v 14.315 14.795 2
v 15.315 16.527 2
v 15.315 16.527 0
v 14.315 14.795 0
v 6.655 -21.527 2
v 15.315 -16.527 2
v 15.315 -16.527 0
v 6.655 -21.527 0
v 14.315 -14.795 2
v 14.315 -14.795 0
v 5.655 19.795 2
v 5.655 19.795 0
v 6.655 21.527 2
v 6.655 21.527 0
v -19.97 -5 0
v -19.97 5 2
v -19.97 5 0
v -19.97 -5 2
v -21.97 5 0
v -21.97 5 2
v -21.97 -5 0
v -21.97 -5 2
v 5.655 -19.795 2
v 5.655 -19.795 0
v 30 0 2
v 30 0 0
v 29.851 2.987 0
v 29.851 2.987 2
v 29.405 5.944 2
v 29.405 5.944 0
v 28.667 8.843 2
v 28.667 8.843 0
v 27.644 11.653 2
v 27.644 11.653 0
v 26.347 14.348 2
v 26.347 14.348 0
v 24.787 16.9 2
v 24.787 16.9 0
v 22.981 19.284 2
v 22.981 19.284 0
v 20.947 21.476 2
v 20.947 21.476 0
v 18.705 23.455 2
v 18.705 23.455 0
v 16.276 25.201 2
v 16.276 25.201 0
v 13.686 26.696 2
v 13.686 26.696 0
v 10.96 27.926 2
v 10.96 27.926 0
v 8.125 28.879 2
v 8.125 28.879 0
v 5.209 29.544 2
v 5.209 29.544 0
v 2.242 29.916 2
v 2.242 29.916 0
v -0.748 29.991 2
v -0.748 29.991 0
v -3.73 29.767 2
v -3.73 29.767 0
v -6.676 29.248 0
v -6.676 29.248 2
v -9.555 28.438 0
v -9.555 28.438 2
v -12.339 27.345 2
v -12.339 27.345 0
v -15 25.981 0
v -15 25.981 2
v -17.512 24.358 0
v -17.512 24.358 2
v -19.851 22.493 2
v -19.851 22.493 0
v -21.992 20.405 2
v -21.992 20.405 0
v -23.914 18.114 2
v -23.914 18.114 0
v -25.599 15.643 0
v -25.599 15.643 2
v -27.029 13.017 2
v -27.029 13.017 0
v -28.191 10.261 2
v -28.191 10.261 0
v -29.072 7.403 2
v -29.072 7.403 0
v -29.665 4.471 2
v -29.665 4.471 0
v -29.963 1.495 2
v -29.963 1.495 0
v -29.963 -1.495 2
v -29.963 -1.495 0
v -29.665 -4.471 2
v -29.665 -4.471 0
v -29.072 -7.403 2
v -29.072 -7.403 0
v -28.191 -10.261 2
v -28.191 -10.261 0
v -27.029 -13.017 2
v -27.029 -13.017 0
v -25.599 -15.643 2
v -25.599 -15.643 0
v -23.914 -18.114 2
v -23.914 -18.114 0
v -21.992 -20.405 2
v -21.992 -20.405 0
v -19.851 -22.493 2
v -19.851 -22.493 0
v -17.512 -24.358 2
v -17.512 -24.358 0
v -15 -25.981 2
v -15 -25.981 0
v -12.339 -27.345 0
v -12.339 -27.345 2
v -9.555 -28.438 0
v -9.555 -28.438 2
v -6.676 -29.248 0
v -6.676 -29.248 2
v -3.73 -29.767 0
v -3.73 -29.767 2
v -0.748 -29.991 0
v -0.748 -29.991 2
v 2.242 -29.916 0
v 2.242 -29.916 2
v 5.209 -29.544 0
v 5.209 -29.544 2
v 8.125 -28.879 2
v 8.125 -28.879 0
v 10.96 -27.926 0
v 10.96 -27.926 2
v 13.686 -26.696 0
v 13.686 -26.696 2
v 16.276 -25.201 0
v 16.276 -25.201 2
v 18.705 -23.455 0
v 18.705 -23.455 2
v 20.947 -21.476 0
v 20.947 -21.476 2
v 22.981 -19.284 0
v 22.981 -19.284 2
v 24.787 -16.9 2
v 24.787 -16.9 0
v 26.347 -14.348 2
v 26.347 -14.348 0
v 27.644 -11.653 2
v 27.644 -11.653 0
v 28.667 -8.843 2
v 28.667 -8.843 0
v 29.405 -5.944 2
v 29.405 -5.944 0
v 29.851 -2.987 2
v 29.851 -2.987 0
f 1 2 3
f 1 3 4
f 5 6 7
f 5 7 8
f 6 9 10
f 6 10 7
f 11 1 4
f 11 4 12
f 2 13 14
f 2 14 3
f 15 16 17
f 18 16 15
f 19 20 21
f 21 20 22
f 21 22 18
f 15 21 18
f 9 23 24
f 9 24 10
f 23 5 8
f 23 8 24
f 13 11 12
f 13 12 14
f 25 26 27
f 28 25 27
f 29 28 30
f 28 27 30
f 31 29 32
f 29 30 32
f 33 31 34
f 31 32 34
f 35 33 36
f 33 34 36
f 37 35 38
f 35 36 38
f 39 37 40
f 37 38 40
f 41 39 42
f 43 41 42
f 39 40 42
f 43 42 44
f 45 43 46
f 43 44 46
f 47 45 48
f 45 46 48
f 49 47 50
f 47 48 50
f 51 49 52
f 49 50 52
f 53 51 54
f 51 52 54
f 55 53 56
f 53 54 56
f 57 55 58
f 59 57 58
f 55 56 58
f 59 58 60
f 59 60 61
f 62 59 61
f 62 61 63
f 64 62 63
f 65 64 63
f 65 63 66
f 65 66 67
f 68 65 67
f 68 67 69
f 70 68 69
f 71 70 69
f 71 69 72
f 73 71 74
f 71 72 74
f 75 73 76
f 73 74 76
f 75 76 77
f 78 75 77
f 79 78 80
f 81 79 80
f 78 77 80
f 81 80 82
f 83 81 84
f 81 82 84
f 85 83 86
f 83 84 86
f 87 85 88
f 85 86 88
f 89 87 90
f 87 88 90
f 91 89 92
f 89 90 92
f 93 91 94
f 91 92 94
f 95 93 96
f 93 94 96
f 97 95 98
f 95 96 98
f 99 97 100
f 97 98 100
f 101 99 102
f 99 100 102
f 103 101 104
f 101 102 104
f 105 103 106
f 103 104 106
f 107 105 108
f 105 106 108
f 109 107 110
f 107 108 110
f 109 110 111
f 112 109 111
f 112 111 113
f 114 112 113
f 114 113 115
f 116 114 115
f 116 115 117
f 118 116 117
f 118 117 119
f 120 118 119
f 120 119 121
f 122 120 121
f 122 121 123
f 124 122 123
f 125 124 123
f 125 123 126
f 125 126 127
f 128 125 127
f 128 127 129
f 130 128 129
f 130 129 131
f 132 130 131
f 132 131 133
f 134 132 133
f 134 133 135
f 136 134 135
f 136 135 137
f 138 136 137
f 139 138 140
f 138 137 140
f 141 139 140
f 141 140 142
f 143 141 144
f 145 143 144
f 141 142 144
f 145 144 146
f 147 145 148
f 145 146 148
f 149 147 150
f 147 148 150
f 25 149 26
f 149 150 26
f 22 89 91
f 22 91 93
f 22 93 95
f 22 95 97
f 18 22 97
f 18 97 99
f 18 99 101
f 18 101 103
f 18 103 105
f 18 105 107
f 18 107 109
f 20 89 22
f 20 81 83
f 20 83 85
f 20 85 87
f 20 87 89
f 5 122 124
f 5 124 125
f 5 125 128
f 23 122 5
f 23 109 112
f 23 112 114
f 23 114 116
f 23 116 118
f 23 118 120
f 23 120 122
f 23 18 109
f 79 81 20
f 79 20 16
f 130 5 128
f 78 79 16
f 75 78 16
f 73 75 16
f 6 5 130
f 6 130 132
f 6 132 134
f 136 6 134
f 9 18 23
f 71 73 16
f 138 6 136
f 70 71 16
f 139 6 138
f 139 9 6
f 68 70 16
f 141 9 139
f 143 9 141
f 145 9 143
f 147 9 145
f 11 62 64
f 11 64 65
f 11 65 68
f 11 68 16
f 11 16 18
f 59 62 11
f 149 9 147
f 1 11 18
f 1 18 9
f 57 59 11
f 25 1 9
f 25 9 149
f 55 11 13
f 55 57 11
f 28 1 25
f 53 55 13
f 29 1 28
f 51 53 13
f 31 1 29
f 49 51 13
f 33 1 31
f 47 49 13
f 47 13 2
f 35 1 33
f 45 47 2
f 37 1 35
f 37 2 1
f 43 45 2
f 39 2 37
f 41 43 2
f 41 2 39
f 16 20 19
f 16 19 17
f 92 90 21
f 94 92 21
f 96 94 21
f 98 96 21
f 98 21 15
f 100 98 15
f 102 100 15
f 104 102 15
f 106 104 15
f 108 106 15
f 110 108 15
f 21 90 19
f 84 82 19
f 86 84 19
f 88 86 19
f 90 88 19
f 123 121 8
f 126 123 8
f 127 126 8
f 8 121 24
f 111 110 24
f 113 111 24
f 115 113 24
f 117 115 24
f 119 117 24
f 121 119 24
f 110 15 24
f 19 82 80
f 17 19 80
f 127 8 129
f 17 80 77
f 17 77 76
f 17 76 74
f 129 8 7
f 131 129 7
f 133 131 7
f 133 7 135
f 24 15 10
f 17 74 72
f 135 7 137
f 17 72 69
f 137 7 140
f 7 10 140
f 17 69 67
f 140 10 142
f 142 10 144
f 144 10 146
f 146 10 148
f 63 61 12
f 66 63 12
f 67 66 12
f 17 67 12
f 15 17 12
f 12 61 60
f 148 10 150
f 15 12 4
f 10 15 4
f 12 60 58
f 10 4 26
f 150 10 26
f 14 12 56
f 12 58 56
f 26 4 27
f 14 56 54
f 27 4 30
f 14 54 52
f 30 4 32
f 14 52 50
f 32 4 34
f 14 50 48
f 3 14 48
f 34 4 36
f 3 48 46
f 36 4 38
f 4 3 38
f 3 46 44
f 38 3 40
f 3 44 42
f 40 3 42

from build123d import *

# Parameters (mm, degrees)
F0_R      = 30
F1_DEPTH  = 2
F2_W      = 2
F2_H      = 10
F3_DEPTH  = 25
F4_COUNT  = 3
F3_FACE_W = 2
F3_FACE_H = 10
F5_DEPTH  = 25
F6_DEPTH  = 25


with BuildPart() as f1:
    # F0 (on Top) → F1 (new body)
    with BuildSketch(Plane.XY):
        Circle(F0_R)
    extrude(amount=F1_DEPTH)

    # F4_face (on face) + F3_face (on face) → F5 (cut)
    with BuildSketch(Plane(origin=(10.4850735515, -18.1606801124, 2), x_dir=(1, 0, 0), z_dir=(0, 0, -1))):
        Polygon((-3.8301270189, 3.3660254038), (-4.8301270189, 1.6339745962), (3.8301270189, -3.3660254038), (4.8301270189, -1.6339745962), align=None)
        Polygon((4.8301270189, -34.6873856285), (3.8301270189, -32.9553348209), (-4.8301270189, -37.9553348209), (-3.8301270189, -39.6873856285), align=None)
    with BuildSketch(Plane(origin=(-20.9701471031, 0, 2), x_dir=(1, 0, 0), z_dir=(0, 0, -1))):
        Rectangle(F3_FACE_W, F3_FACE_H)
    extrude(amount=F5_DEPTH, mode=Mode.SUBTRACT)


with BuildPart() as f3:
    # F2 (on face) → F3 (new body)
    with BuildSketch(Plane.XY.offset(2)):
        with Locations((-20.9701471031, 0)):
            Rectangle(F2_W, F2_H)
    extrude(amount=F3_DEPTH)


with BuildPart() as f4_1:
    # F4: instance of F3
    add(f3.part.rotate(Axis((0, 0, 0), (0, 0, -1)), 1 * 360 / F4_COUNT))


with BuildPart() as f4_2:
    # F4: instance of F3
    add(f3.part.rotate(Axis((0, 0, 0), (0, 0, -1)), 2 * 360 / F4_COUNT))


with BuildPart() as f6_tool:
    # F3_face (on face) + F4_face (on face) → F6 (new body)
    with BuildSketch(Plane(origin=(-20.9701471031, 0, 2), x_dir=(1, 0, 0), z_dir=(0, 0, -1))):
        Rectangle(F3_FACE_W, F3_FACE_H)
    with BuildSketch(Plane(origin=(10.4850735515, -18.1606801124, 2), x_dir=(1, 0, 0), z_dir=(0, 0, -1))):
        Polygon((4.8301270189, -34.6873856285), (3.8301270189, -32.9553348209), (-4.8301270189, -37.9553348209), (-3.8301270189, -39.6873856285), align=None)
        Polygon((-3.8301270189, 3.3660254038), (-4.8301270189, 1.6339745962), (3.8301270189, -3.3660254038), (4.8301270189, -1.6339745962), align=None)
    extrude(amount=-F6_DEPTH)


with BuildPart() as f3_1:
    add(f3.part)

    # F6: cut by f6_tool
    add(f6_tool.part, mode=Mode.SUBTRACT)


with BuildPart() as f4_1_1:
    add(f4_1.part)

    # F6: cut by f6_tool
    add(f6_tool.part, mode=Mode.SUBTRACT)


with BuildPart() as f4_2_1:
    add(f4_2.part)

    # F6: cut by f6_tool
    add(f6_tool.part, mode=Mode.SUBTRACT)


solid = f1.part
